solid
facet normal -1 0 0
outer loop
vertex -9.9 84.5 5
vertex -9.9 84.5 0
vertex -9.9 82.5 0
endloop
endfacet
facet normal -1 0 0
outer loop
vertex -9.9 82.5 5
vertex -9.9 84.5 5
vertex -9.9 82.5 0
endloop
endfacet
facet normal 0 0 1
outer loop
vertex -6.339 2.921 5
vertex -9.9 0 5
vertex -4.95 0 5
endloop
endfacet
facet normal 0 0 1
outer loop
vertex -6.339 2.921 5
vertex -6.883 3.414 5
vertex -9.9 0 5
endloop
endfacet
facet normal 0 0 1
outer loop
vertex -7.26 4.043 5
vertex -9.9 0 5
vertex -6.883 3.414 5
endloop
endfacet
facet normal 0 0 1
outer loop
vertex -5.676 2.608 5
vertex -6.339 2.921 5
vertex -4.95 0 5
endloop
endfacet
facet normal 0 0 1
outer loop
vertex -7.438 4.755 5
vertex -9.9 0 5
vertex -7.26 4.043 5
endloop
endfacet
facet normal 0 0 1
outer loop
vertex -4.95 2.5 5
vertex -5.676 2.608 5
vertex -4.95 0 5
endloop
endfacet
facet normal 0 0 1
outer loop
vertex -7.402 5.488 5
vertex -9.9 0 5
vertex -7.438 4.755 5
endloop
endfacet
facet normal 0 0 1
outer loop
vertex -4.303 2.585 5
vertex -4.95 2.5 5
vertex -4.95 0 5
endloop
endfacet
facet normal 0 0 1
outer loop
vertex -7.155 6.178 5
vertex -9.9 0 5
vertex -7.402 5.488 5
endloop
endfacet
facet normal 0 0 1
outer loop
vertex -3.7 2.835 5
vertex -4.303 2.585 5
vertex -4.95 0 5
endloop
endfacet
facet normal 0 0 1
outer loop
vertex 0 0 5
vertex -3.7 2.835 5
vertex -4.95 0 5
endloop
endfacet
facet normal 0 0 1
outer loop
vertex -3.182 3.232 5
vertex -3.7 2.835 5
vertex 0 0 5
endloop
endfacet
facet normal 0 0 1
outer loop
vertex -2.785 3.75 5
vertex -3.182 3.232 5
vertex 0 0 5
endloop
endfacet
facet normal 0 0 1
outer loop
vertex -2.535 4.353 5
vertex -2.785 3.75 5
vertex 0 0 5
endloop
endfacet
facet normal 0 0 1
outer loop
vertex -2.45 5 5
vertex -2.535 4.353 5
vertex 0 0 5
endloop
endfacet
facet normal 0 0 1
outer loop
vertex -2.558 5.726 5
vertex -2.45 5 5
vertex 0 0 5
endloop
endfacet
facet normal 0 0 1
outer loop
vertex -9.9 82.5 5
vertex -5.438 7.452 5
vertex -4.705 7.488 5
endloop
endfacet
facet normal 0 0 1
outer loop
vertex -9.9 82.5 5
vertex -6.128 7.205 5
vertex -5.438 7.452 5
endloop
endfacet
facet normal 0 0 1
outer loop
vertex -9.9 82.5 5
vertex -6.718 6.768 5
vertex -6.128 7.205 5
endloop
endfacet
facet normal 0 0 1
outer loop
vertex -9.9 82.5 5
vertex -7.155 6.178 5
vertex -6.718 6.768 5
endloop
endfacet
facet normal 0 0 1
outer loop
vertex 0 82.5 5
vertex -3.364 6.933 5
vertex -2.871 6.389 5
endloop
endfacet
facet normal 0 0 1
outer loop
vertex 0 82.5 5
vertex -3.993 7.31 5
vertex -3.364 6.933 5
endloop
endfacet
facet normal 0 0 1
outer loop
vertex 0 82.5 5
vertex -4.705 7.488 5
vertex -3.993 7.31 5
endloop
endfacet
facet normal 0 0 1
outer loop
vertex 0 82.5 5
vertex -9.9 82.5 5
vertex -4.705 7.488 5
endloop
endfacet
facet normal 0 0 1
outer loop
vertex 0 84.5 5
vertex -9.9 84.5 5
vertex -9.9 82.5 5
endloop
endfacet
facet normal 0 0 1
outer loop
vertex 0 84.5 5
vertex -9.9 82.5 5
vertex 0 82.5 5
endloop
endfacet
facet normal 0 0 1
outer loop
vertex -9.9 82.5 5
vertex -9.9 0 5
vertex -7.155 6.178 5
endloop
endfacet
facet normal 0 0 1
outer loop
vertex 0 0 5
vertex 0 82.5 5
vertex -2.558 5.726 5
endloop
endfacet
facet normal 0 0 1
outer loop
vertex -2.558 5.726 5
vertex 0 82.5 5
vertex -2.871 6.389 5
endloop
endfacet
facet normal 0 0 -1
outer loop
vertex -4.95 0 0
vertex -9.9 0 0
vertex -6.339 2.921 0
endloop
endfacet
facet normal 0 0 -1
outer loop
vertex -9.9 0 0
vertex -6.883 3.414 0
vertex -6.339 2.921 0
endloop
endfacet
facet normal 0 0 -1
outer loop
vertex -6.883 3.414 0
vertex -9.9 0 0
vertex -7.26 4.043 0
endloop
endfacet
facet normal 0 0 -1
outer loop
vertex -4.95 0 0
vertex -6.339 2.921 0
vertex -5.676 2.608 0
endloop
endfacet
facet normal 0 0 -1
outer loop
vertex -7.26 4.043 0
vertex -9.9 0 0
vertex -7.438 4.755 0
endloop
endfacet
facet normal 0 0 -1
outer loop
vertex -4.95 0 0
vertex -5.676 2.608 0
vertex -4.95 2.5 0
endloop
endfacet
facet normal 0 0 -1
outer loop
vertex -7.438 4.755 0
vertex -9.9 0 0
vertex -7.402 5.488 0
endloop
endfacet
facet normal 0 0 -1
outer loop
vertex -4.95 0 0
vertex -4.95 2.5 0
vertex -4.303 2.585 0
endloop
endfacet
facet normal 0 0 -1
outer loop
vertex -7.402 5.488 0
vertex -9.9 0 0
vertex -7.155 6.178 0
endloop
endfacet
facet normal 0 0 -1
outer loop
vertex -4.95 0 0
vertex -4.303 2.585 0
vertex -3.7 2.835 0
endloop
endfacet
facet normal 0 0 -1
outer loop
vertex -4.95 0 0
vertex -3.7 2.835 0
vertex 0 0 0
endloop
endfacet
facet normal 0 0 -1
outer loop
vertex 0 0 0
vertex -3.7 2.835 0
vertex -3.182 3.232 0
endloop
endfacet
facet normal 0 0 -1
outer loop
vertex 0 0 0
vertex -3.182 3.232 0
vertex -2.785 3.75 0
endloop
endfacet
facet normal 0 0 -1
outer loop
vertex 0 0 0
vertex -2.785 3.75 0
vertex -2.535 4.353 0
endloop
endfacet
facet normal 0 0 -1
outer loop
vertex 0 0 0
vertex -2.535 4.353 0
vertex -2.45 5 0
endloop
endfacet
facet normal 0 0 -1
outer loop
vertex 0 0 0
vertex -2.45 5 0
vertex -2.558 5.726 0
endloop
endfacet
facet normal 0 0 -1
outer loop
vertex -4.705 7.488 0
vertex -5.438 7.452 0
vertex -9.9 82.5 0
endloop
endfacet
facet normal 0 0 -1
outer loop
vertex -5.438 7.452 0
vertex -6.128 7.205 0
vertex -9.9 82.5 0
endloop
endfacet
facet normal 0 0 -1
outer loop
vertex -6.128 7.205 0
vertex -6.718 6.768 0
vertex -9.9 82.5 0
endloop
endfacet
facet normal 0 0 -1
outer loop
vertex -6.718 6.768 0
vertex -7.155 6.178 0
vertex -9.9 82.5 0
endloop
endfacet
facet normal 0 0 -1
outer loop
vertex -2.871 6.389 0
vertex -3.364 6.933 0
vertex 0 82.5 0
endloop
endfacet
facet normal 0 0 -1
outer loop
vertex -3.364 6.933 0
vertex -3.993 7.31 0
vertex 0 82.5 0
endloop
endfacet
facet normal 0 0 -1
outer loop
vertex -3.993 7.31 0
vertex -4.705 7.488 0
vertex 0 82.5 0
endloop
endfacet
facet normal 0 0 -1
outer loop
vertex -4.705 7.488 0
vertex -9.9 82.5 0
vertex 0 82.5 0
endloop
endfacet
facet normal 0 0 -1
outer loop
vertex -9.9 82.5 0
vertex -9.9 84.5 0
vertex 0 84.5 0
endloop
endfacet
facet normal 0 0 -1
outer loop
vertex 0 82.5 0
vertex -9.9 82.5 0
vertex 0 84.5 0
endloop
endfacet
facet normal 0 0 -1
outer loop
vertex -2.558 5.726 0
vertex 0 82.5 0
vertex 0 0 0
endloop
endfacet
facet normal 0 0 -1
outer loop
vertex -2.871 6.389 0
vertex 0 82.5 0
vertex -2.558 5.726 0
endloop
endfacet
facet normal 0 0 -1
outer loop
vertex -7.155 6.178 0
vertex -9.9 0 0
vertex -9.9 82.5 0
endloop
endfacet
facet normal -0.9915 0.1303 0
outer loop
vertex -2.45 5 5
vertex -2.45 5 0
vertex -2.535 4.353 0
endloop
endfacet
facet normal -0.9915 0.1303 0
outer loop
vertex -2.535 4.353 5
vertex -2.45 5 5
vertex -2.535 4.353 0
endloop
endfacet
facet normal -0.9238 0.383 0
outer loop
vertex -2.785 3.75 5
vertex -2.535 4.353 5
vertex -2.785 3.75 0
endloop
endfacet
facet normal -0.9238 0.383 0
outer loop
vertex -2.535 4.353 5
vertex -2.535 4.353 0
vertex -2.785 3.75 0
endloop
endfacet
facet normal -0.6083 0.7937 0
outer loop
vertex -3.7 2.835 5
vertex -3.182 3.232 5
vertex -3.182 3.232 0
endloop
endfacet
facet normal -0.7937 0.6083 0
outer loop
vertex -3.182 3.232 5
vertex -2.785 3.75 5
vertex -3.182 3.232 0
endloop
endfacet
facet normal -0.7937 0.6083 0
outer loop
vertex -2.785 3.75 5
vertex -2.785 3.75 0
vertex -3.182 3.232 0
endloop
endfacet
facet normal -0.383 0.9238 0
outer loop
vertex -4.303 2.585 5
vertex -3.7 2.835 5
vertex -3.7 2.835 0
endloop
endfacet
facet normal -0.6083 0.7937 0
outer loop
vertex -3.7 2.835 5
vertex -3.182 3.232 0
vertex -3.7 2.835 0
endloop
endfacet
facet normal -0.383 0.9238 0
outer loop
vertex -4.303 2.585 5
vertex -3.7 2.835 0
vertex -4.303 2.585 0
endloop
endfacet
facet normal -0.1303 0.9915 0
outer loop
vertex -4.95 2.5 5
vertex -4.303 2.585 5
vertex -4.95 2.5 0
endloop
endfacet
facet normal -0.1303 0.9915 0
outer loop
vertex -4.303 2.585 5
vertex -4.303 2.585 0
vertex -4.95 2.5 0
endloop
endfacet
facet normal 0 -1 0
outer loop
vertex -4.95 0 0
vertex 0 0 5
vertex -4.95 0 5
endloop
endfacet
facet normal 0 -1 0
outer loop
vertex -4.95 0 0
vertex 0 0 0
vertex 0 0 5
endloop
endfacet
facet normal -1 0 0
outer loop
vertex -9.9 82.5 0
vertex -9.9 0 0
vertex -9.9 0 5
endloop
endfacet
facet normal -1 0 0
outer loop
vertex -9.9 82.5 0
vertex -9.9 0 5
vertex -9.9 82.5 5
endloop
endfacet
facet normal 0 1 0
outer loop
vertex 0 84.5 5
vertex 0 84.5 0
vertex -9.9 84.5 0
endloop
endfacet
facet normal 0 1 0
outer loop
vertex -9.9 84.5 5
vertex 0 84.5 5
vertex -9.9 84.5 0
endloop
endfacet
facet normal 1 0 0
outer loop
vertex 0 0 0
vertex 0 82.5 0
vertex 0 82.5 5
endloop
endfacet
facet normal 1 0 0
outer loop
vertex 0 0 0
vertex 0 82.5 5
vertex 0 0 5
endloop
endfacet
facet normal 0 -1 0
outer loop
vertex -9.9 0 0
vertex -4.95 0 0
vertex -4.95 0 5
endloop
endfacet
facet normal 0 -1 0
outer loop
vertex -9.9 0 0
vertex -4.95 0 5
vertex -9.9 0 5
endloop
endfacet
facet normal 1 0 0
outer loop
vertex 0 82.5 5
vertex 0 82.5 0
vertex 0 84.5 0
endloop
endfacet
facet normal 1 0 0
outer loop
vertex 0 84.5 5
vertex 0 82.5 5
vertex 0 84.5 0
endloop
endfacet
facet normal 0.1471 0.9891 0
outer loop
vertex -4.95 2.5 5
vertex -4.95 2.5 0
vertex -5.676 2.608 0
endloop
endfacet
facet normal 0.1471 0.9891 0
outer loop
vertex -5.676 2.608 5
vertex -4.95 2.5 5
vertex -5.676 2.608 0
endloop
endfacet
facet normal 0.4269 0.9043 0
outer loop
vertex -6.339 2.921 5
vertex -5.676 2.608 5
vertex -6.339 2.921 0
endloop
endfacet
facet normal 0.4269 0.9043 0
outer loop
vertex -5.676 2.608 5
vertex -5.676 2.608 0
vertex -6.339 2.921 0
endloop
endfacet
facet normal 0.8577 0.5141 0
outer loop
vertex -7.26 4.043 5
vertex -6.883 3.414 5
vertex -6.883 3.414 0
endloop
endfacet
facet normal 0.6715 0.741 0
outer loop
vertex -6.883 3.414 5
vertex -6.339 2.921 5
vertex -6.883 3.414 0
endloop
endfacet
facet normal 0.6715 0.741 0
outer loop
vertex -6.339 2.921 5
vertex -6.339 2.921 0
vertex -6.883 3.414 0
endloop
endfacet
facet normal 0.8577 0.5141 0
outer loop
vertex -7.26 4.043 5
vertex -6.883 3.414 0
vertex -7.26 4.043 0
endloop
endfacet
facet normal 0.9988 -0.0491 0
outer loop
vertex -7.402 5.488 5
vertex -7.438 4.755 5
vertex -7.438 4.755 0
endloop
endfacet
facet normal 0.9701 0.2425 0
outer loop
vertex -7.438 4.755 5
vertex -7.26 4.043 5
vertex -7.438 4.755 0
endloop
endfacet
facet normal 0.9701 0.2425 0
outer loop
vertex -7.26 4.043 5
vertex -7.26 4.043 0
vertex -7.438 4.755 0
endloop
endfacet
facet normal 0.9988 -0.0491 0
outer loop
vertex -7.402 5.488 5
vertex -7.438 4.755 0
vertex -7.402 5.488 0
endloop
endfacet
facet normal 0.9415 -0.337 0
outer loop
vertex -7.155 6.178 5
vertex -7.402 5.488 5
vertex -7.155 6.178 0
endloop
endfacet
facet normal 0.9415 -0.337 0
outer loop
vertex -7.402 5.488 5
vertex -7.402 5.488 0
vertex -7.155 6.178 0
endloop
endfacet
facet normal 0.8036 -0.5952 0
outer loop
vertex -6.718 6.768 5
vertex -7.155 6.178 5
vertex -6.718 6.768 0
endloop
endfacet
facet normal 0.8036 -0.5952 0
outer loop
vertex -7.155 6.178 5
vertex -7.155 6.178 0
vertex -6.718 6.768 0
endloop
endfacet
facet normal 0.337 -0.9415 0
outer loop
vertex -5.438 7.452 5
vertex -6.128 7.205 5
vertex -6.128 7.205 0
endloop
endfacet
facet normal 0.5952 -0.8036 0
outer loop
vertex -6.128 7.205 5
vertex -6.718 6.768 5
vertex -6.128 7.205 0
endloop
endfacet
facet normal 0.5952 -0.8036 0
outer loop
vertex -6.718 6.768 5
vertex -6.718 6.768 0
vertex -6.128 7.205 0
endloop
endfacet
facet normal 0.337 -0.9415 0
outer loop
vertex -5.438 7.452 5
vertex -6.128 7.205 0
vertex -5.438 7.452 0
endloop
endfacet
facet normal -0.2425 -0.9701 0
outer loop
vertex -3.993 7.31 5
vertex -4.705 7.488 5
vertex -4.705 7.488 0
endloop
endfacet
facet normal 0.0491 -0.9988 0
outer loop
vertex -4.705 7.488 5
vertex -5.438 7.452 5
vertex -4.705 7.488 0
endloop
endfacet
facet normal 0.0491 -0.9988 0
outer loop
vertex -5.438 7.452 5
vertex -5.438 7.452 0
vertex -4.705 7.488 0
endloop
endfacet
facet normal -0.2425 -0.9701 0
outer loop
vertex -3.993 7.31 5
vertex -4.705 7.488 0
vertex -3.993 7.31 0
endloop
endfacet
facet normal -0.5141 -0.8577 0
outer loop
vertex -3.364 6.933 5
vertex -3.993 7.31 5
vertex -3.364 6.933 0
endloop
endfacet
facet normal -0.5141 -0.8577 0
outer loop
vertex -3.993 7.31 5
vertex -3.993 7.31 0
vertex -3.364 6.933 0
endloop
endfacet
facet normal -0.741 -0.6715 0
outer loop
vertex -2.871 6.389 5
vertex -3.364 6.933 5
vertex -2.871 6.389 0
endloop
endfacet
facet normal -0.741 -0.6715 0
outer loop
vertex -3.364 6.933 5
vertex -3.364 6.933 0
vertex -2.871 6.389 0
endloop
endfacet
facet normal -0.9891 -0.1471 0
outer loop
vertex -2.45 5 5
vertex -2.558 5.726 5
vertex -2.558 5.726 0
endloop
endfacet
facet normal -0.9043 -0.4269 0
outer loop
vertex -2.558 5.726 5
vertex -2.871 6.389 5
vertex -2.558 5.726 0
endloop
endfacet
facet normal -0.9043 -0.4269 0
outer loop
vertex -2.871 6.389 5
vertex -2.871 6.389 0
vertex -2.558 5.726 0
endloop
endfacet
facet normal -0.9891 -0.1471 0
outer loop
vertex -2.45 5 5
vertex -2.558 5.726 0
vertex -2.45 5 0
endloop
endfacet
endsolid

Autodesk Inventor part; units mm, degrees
ref_plane "YZ Plane" through (0, 0, 0) normal (1, 0, 0) x (0, 1, 0)
ref_plane "XZ Plane" through (0, 0, 0) normal (0, 1, 0) x (-1, 0, 0)
ref_plane "XY Plane" through (0, 0, 0) normal (0, 0, 1) x (1, 0, 0)
sketch "Sketch2" plane through (0, 0, 0) normal (0, 0, 1) x (1, 0, 0)
  line L0 (0, 0) -> (-9.9, 0)
  line L1 (-4.95, 0) -> (-4.95, 2.5)
  line L2 (-4.95, 0) -> (-2.45, 0) construction
  circle A0 centre (-4.95, 5) radius 2.5
  line L3 (-4.95, 7.5) -> (32.05, 7.5) construction
  line L4 (0, 0) -> (-9.9, 0)
  line L5 (0, 0) -> (-9.9, 0)
  line L6 (-4.95, 7.5) -> (66.05, 7.5) construction
  line L7 (-4.95, 7.5) -> (70.05, 7.5) construction
  line L8 (0, 0) -> (-9.9, 0)
  line L9 (-9.9, 0) -> (-9.9, 82.5)
  line L10 (0, 82.5) -> (0, 0)
  line L11 (0, 82.5) -> (0, 84.5)
  line L12 (0, 84.5) -> (-9.9, 84.5)
  line L13 (-9.9, 84.5) -> (-9.9, 82.5)
  dimension "d35" = 5
  dimension "d33" = 2.5
  dimension "d34" = 90
  dimension "d48" = 9.9
  dimension "d49" = 9.9
  dimension "d50" = 2
extrude "Extrusion6" add sketch "Sketch2" along normal blind 5
properties part number "Cube_Holder_SB_V1_(71mm)"
